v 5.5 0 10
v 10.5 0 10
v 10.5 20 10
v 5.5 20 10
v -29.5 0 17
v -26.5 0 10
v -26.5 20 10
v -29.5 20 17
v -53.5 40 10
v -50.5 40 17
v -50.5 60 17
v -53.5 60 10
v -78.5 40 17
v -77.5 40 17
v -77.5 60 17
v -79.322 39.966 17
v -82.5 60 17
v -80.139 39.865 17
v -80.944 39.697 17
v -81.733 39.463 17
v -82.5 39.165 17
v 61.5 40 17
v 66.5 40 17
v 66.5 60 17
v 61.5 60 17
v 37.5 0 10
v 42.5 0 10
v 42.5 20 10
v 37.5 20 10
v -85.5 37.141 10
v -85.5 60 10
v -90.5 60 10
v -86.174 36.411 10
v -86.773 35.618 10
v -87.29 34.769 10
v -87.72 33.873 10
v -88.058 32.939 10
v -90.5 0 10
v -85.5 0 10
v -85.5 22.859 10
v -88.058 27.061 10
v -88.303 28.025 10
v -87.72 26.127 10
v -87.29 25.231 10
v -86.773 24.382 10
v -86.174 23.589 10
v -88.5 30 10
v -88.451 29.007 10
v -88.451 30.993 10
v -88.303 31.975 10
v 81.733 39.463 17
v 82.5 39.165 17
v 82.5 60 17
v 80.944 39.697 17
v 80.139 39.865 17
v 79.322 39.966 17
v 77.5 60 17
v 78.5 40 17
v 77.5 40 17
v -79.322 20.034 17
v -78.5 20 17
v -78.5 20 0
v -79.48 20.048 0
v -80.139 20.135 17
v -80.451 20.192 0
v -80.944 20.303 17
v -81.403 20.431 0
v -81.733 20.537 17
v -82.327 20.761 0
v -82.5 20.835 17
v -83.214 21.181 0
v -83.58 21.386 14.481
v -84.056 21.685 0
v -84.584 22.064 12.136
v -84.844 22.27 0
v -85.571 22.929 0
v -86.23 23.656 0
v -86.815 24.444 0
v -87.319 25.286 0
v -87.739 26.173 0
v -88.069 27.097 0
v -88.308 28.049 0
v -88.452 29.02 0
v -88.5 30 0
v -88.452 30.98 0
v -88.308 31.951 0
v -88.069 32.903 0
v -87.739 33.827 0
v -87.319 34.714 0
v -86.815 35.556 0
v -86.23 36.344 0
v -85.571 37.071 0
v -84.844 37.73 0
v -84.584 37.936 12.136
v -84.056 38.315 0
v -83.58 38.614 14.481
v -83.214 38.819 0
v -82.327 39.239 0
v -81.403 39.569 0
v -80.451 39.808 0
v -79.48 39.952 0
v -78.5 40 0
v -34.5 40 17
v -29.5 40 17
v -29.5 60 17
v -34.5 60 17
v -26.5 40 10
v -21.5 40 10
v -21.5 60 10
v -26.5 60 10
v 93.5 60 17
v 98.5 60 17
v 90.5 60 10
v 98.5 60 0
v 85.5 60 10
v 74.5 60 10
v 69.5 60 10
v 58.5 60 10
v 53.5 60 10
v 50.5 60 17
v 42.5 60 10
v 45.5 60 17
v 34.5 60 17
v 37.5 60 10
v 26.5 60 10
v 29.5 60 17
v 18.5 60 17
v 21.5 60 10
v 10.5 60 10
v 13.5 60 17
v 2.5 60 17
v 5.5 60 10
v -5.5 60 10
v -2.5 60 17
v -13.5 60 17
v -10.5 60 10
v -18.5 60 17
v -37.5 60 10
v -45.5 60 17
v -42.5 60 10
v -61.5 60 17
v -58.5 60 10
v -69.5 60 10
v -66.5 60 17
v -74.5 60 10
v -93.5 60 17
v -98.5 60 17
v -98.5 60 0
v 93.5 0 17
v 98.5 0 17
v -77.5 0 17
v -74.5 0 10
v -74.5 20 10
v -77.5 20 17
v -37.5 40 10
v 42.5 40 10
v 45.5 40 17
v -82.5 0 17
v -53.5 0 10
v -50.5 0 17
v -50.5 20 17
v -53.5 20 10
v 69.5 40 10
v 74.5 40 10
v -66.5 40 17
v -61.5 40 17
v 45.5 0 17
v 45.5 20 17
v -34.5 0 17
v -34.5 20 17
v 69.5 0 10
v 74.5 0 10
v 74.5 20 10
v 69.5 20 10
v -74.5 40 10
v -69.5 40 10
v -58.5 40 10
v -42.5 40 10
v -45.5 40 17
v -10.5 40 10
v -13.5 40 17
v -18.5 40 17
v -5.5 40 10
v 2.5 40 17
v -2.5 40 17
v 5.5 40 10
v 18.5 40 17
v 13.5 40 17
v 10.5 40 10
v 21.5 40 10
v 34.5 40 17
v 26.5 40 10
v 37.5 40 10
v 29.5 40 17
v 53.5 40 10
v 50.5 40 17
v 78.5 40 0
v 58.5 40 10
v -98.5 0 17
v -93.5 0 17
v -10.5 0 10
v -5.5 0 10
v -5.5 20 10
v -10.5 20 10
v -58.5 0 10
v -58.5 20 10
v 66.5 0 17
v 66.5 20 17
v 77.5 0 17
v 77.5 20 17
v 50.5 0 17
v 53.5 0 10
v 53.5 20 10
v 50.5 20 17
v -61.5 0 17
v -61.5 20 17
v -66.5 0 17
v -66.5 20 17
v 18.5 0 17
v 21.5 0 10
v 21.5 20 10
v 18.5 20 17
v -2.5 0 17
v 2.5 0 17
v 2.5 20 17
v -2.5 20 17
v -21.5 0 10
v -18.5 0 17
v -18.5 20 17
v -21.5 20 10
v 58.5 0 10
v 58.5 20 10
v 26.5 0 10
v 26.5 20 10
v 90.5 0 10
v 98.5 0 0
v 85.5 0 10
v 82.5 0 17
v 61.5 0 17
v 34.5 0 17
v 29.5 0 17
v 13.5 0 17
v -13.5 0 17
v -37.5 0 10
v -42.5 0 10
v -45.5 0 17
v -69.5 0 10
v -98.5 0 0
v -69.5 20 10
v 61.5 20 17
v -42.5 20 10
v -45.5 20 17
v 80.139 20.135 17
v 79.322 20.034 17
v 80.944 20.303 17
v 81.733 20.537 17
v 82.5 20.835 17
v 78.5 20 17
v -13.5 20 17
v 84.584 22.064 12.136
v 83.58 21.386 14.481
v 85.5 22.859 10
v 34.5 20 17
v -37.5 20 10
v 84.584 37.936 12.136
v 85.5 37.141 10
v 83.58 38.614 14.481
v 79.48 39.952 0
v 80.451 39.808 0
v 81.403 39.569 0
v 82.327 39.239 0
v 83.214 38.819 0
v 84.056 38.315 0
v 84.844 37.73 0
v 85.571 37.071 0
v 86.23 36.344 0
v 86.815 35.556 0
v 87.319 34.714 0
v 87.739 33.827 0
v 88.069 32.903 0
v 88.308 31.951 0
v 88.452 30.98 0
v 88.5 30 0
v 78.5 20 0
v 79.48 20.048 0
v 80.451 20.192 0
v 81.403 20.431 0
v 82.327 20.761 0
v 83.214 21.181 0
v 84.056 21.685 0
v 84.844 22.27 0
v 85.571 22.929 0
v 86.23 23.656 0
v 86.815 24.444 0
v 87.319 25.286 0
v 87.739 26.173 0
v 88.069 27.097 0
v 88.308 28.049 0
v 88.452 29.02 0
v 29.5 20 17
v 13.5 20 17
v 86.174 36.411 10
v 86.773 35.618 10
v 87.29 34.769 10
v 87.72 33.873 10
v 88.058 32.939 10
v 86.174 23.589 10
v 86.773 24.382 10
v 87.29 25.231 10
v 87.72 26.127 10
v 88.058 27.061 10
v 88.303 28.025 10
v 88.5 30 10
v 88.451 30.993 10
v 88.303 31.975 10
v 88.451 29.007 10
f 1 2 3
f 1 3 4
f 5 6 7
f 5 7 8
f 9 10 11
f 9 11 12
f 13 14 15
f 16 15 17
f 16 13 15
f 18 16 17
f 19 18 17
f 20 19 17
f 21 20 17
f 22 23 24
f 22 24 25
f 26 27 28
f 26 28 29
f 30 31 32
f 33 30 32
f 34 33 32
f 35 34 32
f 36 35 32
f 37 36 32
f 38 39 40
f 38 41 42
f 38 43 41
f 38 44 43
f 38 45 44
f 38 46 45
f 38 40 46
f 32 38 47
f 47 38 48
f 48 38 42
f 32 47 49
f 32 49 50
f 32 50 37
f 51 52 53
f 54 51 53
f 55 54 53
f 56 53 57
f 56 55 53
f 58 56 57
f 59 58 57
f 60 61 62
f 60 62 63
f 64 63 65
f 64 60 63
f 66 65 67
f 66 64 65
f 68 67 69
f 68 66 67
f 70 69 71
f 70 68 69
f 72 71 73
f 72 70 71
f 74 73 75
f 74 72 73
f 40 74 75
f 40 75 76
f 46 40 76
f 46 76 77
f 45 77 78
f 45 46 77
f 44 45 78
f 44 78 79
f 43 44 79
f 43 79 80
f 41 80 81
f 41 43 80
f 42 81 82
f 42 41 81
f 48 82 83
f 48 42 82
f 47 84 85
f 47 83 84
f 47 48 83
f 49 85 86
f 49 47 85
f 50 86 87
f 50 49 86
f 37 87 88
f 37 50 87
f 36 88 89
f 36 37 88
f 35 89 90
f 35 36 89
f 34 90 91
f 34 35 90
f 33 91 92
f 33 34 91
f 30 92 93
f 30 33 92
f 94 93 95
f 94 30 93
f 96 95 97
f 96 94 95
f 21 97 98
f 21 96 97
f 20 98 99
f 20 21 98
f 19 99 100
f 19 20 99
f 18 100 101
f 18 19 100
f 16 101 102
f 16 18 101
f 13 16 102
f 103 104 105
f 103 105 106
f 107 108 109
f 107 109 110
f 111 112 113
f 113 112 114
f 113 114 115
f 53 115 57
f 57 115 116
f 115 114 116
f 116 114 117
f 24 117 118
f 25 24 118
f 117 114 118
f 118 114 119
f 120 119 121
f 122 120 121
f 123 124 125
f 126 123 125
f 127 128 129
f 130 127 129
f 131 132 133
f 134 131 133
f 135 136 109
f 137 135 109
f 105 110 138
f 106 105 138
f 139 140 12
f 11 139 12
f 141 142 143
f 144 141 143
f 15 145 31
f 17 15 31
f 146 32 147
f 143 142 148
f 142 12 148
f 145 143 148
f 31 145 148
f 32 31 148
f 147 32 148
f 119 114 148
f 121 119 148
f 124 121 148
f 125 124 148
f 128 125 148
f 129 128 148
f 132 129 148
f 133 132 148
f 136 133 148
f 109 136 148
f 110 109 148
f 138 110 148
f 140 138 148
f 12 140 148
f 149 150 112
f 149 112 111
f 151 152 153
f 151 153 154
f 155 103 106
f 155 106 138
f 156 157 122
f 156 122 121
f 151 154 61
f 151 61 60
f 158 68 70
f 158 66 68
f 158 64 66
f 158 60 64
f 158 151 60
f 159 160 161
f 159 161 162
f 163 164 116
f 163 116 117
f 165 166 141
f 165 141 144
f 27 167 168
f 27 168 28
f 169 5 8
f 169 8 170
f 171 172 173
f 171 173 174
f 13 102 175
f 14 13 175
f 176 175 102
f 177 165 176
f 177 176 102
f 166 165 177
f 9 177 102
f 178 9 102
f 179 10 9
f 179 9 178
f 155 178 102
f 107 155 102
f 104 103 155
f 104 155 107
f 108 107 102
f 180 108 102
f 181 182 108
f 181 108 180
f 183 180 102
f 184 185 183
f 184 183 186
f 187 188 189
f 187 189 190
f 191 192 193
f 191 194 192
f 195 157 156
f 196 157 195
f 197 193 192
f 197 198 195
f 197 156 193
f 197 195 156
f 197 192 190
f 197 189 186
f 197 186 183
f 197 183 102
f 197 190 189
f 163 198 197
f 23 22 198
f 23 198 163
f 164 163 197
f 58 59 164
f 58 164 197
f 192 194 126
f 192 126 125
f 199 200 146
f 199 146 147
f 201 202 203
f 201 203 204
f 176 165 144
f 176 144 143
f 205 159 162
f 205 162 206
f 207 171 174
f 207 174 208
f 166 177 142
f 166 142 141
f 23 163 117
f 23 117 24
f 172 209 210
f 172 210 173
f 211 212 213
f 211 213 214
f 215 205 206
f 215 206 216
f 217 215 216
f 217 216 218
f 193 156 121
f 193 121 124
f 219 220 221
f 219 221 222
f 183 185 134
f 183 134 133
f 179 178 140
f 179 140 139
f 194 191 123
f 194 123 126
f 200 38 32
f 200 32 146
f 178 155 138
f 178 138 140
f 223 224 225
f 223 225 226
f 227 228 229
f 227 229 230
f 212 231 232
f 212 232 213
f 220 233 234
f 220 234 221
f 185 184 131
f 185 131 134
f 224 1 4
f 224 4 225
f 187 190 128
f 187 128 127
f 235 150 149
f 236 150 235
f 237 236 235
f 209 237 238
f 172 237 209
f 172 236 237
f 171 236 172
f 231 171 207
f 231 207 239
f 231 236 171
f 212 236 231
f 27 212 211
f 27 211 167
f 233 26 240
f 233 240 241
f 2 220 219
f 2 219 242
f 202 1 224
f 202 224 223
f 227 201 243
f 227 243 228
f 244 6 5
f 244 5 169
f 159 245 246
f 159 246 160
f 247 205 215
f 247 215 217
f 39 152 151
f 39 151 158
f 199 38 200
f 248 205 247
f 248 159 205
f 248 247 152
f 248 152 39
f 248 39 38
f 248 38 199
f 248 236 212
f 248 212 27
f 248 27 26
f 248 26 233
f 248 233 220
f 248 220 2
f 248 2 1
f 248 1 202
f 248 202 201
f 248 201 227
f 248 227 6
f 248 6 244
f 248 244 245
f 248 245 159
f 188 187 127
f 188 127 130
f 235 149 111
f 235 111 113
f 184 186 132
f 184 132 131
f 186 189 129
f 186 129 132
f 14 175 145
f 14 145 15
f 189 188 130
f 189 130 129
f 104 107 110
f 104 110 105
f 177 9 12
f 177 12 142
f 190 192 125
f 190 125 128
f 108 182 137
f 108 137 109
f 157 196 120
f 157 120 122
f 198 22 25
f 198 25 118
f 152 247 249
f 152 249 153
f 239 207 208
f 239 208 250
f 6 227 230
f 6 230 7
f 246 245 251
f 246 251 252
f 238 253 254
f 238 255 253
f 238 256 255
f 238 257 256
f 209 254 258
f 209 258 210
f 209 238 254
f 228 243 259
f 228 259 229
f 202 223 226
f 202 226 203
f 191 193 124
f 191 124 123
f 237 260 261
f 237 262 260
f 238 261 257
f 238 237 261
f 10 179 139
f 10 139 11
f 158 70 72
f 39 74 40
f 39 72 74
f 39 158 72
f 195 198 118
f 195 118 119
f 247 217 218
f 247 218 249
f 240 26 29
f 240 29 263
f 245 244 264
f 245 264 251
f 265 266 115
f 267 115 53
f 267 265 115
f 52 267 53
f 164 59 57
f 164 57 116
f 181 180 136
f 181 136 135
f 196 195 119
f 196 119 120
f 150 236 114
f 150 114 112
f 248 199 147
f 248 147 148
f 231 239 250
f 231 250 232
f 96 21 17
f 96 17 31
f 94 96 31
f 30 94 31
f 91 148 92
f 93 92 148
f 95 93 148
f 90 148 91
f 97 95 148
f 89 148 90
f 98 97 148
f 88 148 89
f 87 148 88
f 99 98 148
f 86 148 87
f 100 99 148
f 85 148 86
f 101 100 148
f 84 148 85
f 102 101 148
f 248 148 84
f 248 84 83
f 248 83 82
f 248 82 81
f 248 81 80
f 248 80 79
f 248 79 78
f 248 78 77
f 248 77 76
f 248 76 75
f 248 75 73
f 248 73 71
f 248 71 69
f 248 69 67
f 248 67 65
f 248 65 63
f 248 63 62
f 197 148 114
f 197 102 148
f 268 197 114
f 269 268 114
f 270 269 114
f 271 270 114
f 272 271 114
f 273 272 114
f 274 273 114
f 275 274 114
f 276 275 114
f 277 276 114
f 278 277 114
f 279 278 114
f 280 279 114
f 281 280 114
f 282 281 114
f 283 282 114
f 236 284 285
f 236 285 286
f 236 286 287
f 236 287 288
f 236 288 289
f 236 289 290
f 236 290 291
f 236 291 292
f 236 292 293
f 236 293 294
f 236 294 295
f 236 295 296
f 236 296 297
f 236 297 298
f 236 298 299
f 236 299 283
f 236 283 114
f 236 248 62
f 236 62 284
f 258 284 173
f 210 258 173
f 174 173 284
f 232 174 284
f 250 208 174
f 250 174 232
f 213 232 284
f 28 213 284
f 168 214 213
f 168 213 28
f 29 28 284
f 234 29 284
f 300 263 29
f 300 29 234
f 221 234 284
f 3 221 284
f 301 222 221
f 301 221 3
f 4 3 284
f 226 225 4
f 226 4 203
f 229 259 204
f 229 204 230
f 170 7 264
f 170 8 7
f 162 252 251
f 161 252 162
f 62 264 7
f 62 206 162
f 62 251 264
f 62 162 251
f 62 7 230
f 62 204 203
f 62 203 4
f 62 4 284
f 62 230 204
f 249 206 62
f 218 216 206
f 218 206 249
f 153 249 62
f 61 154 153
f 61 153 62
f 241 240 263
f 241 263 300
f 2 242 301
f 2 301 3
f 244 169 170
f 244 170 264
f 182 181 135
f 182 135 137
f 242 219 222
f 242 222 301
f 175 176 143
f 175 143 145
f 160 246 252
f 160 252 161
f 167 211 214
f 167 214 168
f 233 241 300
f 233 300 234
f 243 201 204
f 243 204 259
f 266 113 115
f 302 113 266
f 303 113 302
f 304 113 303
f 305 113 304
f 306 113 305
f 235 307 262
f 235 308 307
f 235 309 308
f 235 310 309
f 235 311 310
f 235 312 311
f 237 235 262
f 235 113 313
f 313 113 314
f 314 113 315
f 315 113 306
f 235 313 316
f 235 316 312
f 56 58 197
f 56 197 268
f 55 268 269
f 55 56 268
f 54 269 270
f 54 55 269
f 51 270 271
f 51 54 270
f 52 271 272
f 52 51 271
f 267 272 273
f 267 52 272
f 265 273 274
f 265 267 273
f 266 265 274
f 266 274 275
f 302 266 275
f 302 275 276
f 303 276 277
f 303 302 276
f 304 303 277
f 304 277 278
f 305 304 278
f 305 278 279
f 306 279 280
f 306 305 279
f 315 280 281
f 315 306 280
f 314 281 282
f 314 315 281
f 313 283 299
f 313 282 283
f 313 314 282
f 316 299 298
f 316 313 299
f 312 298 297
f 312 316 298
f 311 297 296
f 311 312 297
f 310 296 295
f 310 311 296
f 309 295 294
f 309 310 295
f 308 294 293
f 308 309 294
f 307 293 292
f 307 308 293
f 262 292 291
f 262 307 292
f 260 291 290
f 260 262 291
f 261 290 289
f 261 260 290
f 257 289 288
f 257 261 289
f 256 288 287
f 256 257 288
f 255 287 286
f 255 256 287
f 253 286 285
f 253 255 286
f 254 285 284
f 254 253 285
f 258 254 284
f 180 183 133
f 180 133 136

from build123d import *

# Parameters (mm, degrees)
BOSS_EXTRUDE1_DEPTH = 60
CUT_EXTRUDE1_DEPTH  = 30


with BuildPart() as part:
    # Sketch1 → Boss-Extrude1 (new body)
    with BuildSketch(Plane(origin=(0, 0, 0), x_dir=(1, 0, 0), z_dir=(0, 1, 0))):
        Polygon((-98.5, 0), (98.5, 0), (98.5, -17), (93.5, -17), (90.5, -10), (85.5, -10), (82.5, -17), (77.5, -17), (74.5, -10), (69.5, -10), (66.5, -17), (61.5, -17), (58.5, -10), (53.5, -10), (50.5, -17), (45.5, -17), (42.5, -10), (37.5, -10), (34.5, -17), (29.5, -17), (26.5, -10), (21.5, -10), (18.5, -17), (13.5, -17), (10.5, -10), (5.5, -10), (2.5, -17), (-2.5, -17), (-5.5, -10), (-10.5, -10), (-13.5, -17), (-18.5, -17), (-21.5, -10), (-26.5, -10), (-29.5, -17), (-34.5, -17), (-37.5, -10), (-42.5, -10), (-45.5, -17), (-50.5, -17), (-53.5, -10), (-58.5, -10), (-61.5, -17), (-66.5, -17), (-69.5, -10), (-74.5, -10), (-77.5, -17), (-82.5, -17), (-85.5, -10), (-90.5, -10), (-93.5, -17), (-98.5, -17), align=None)
    extrude(amount=BOSS_EXTRUDE1_DEPTH)

    # Sketch2 → Cut-Extrude1 (cut, symmetric)
    with BuildSketch(Plane.XY):
        with BuildLine():
            Line((-78.5, 40), (78.5, 40))
            ThreePointArc((78.5, 40), (88.5, 30), (78.5, 20))
            Line((78.5, 20), (-78.5, 20))
            ThreePointArc((-78.5, 20), (-88.5, 30), (-78.5, 40))
        make_face()
    extrude(amount=CUT_EXTRUDE1_DEPTH, both=True, mode=Mode.SUBTRACT)


solid = part.part
